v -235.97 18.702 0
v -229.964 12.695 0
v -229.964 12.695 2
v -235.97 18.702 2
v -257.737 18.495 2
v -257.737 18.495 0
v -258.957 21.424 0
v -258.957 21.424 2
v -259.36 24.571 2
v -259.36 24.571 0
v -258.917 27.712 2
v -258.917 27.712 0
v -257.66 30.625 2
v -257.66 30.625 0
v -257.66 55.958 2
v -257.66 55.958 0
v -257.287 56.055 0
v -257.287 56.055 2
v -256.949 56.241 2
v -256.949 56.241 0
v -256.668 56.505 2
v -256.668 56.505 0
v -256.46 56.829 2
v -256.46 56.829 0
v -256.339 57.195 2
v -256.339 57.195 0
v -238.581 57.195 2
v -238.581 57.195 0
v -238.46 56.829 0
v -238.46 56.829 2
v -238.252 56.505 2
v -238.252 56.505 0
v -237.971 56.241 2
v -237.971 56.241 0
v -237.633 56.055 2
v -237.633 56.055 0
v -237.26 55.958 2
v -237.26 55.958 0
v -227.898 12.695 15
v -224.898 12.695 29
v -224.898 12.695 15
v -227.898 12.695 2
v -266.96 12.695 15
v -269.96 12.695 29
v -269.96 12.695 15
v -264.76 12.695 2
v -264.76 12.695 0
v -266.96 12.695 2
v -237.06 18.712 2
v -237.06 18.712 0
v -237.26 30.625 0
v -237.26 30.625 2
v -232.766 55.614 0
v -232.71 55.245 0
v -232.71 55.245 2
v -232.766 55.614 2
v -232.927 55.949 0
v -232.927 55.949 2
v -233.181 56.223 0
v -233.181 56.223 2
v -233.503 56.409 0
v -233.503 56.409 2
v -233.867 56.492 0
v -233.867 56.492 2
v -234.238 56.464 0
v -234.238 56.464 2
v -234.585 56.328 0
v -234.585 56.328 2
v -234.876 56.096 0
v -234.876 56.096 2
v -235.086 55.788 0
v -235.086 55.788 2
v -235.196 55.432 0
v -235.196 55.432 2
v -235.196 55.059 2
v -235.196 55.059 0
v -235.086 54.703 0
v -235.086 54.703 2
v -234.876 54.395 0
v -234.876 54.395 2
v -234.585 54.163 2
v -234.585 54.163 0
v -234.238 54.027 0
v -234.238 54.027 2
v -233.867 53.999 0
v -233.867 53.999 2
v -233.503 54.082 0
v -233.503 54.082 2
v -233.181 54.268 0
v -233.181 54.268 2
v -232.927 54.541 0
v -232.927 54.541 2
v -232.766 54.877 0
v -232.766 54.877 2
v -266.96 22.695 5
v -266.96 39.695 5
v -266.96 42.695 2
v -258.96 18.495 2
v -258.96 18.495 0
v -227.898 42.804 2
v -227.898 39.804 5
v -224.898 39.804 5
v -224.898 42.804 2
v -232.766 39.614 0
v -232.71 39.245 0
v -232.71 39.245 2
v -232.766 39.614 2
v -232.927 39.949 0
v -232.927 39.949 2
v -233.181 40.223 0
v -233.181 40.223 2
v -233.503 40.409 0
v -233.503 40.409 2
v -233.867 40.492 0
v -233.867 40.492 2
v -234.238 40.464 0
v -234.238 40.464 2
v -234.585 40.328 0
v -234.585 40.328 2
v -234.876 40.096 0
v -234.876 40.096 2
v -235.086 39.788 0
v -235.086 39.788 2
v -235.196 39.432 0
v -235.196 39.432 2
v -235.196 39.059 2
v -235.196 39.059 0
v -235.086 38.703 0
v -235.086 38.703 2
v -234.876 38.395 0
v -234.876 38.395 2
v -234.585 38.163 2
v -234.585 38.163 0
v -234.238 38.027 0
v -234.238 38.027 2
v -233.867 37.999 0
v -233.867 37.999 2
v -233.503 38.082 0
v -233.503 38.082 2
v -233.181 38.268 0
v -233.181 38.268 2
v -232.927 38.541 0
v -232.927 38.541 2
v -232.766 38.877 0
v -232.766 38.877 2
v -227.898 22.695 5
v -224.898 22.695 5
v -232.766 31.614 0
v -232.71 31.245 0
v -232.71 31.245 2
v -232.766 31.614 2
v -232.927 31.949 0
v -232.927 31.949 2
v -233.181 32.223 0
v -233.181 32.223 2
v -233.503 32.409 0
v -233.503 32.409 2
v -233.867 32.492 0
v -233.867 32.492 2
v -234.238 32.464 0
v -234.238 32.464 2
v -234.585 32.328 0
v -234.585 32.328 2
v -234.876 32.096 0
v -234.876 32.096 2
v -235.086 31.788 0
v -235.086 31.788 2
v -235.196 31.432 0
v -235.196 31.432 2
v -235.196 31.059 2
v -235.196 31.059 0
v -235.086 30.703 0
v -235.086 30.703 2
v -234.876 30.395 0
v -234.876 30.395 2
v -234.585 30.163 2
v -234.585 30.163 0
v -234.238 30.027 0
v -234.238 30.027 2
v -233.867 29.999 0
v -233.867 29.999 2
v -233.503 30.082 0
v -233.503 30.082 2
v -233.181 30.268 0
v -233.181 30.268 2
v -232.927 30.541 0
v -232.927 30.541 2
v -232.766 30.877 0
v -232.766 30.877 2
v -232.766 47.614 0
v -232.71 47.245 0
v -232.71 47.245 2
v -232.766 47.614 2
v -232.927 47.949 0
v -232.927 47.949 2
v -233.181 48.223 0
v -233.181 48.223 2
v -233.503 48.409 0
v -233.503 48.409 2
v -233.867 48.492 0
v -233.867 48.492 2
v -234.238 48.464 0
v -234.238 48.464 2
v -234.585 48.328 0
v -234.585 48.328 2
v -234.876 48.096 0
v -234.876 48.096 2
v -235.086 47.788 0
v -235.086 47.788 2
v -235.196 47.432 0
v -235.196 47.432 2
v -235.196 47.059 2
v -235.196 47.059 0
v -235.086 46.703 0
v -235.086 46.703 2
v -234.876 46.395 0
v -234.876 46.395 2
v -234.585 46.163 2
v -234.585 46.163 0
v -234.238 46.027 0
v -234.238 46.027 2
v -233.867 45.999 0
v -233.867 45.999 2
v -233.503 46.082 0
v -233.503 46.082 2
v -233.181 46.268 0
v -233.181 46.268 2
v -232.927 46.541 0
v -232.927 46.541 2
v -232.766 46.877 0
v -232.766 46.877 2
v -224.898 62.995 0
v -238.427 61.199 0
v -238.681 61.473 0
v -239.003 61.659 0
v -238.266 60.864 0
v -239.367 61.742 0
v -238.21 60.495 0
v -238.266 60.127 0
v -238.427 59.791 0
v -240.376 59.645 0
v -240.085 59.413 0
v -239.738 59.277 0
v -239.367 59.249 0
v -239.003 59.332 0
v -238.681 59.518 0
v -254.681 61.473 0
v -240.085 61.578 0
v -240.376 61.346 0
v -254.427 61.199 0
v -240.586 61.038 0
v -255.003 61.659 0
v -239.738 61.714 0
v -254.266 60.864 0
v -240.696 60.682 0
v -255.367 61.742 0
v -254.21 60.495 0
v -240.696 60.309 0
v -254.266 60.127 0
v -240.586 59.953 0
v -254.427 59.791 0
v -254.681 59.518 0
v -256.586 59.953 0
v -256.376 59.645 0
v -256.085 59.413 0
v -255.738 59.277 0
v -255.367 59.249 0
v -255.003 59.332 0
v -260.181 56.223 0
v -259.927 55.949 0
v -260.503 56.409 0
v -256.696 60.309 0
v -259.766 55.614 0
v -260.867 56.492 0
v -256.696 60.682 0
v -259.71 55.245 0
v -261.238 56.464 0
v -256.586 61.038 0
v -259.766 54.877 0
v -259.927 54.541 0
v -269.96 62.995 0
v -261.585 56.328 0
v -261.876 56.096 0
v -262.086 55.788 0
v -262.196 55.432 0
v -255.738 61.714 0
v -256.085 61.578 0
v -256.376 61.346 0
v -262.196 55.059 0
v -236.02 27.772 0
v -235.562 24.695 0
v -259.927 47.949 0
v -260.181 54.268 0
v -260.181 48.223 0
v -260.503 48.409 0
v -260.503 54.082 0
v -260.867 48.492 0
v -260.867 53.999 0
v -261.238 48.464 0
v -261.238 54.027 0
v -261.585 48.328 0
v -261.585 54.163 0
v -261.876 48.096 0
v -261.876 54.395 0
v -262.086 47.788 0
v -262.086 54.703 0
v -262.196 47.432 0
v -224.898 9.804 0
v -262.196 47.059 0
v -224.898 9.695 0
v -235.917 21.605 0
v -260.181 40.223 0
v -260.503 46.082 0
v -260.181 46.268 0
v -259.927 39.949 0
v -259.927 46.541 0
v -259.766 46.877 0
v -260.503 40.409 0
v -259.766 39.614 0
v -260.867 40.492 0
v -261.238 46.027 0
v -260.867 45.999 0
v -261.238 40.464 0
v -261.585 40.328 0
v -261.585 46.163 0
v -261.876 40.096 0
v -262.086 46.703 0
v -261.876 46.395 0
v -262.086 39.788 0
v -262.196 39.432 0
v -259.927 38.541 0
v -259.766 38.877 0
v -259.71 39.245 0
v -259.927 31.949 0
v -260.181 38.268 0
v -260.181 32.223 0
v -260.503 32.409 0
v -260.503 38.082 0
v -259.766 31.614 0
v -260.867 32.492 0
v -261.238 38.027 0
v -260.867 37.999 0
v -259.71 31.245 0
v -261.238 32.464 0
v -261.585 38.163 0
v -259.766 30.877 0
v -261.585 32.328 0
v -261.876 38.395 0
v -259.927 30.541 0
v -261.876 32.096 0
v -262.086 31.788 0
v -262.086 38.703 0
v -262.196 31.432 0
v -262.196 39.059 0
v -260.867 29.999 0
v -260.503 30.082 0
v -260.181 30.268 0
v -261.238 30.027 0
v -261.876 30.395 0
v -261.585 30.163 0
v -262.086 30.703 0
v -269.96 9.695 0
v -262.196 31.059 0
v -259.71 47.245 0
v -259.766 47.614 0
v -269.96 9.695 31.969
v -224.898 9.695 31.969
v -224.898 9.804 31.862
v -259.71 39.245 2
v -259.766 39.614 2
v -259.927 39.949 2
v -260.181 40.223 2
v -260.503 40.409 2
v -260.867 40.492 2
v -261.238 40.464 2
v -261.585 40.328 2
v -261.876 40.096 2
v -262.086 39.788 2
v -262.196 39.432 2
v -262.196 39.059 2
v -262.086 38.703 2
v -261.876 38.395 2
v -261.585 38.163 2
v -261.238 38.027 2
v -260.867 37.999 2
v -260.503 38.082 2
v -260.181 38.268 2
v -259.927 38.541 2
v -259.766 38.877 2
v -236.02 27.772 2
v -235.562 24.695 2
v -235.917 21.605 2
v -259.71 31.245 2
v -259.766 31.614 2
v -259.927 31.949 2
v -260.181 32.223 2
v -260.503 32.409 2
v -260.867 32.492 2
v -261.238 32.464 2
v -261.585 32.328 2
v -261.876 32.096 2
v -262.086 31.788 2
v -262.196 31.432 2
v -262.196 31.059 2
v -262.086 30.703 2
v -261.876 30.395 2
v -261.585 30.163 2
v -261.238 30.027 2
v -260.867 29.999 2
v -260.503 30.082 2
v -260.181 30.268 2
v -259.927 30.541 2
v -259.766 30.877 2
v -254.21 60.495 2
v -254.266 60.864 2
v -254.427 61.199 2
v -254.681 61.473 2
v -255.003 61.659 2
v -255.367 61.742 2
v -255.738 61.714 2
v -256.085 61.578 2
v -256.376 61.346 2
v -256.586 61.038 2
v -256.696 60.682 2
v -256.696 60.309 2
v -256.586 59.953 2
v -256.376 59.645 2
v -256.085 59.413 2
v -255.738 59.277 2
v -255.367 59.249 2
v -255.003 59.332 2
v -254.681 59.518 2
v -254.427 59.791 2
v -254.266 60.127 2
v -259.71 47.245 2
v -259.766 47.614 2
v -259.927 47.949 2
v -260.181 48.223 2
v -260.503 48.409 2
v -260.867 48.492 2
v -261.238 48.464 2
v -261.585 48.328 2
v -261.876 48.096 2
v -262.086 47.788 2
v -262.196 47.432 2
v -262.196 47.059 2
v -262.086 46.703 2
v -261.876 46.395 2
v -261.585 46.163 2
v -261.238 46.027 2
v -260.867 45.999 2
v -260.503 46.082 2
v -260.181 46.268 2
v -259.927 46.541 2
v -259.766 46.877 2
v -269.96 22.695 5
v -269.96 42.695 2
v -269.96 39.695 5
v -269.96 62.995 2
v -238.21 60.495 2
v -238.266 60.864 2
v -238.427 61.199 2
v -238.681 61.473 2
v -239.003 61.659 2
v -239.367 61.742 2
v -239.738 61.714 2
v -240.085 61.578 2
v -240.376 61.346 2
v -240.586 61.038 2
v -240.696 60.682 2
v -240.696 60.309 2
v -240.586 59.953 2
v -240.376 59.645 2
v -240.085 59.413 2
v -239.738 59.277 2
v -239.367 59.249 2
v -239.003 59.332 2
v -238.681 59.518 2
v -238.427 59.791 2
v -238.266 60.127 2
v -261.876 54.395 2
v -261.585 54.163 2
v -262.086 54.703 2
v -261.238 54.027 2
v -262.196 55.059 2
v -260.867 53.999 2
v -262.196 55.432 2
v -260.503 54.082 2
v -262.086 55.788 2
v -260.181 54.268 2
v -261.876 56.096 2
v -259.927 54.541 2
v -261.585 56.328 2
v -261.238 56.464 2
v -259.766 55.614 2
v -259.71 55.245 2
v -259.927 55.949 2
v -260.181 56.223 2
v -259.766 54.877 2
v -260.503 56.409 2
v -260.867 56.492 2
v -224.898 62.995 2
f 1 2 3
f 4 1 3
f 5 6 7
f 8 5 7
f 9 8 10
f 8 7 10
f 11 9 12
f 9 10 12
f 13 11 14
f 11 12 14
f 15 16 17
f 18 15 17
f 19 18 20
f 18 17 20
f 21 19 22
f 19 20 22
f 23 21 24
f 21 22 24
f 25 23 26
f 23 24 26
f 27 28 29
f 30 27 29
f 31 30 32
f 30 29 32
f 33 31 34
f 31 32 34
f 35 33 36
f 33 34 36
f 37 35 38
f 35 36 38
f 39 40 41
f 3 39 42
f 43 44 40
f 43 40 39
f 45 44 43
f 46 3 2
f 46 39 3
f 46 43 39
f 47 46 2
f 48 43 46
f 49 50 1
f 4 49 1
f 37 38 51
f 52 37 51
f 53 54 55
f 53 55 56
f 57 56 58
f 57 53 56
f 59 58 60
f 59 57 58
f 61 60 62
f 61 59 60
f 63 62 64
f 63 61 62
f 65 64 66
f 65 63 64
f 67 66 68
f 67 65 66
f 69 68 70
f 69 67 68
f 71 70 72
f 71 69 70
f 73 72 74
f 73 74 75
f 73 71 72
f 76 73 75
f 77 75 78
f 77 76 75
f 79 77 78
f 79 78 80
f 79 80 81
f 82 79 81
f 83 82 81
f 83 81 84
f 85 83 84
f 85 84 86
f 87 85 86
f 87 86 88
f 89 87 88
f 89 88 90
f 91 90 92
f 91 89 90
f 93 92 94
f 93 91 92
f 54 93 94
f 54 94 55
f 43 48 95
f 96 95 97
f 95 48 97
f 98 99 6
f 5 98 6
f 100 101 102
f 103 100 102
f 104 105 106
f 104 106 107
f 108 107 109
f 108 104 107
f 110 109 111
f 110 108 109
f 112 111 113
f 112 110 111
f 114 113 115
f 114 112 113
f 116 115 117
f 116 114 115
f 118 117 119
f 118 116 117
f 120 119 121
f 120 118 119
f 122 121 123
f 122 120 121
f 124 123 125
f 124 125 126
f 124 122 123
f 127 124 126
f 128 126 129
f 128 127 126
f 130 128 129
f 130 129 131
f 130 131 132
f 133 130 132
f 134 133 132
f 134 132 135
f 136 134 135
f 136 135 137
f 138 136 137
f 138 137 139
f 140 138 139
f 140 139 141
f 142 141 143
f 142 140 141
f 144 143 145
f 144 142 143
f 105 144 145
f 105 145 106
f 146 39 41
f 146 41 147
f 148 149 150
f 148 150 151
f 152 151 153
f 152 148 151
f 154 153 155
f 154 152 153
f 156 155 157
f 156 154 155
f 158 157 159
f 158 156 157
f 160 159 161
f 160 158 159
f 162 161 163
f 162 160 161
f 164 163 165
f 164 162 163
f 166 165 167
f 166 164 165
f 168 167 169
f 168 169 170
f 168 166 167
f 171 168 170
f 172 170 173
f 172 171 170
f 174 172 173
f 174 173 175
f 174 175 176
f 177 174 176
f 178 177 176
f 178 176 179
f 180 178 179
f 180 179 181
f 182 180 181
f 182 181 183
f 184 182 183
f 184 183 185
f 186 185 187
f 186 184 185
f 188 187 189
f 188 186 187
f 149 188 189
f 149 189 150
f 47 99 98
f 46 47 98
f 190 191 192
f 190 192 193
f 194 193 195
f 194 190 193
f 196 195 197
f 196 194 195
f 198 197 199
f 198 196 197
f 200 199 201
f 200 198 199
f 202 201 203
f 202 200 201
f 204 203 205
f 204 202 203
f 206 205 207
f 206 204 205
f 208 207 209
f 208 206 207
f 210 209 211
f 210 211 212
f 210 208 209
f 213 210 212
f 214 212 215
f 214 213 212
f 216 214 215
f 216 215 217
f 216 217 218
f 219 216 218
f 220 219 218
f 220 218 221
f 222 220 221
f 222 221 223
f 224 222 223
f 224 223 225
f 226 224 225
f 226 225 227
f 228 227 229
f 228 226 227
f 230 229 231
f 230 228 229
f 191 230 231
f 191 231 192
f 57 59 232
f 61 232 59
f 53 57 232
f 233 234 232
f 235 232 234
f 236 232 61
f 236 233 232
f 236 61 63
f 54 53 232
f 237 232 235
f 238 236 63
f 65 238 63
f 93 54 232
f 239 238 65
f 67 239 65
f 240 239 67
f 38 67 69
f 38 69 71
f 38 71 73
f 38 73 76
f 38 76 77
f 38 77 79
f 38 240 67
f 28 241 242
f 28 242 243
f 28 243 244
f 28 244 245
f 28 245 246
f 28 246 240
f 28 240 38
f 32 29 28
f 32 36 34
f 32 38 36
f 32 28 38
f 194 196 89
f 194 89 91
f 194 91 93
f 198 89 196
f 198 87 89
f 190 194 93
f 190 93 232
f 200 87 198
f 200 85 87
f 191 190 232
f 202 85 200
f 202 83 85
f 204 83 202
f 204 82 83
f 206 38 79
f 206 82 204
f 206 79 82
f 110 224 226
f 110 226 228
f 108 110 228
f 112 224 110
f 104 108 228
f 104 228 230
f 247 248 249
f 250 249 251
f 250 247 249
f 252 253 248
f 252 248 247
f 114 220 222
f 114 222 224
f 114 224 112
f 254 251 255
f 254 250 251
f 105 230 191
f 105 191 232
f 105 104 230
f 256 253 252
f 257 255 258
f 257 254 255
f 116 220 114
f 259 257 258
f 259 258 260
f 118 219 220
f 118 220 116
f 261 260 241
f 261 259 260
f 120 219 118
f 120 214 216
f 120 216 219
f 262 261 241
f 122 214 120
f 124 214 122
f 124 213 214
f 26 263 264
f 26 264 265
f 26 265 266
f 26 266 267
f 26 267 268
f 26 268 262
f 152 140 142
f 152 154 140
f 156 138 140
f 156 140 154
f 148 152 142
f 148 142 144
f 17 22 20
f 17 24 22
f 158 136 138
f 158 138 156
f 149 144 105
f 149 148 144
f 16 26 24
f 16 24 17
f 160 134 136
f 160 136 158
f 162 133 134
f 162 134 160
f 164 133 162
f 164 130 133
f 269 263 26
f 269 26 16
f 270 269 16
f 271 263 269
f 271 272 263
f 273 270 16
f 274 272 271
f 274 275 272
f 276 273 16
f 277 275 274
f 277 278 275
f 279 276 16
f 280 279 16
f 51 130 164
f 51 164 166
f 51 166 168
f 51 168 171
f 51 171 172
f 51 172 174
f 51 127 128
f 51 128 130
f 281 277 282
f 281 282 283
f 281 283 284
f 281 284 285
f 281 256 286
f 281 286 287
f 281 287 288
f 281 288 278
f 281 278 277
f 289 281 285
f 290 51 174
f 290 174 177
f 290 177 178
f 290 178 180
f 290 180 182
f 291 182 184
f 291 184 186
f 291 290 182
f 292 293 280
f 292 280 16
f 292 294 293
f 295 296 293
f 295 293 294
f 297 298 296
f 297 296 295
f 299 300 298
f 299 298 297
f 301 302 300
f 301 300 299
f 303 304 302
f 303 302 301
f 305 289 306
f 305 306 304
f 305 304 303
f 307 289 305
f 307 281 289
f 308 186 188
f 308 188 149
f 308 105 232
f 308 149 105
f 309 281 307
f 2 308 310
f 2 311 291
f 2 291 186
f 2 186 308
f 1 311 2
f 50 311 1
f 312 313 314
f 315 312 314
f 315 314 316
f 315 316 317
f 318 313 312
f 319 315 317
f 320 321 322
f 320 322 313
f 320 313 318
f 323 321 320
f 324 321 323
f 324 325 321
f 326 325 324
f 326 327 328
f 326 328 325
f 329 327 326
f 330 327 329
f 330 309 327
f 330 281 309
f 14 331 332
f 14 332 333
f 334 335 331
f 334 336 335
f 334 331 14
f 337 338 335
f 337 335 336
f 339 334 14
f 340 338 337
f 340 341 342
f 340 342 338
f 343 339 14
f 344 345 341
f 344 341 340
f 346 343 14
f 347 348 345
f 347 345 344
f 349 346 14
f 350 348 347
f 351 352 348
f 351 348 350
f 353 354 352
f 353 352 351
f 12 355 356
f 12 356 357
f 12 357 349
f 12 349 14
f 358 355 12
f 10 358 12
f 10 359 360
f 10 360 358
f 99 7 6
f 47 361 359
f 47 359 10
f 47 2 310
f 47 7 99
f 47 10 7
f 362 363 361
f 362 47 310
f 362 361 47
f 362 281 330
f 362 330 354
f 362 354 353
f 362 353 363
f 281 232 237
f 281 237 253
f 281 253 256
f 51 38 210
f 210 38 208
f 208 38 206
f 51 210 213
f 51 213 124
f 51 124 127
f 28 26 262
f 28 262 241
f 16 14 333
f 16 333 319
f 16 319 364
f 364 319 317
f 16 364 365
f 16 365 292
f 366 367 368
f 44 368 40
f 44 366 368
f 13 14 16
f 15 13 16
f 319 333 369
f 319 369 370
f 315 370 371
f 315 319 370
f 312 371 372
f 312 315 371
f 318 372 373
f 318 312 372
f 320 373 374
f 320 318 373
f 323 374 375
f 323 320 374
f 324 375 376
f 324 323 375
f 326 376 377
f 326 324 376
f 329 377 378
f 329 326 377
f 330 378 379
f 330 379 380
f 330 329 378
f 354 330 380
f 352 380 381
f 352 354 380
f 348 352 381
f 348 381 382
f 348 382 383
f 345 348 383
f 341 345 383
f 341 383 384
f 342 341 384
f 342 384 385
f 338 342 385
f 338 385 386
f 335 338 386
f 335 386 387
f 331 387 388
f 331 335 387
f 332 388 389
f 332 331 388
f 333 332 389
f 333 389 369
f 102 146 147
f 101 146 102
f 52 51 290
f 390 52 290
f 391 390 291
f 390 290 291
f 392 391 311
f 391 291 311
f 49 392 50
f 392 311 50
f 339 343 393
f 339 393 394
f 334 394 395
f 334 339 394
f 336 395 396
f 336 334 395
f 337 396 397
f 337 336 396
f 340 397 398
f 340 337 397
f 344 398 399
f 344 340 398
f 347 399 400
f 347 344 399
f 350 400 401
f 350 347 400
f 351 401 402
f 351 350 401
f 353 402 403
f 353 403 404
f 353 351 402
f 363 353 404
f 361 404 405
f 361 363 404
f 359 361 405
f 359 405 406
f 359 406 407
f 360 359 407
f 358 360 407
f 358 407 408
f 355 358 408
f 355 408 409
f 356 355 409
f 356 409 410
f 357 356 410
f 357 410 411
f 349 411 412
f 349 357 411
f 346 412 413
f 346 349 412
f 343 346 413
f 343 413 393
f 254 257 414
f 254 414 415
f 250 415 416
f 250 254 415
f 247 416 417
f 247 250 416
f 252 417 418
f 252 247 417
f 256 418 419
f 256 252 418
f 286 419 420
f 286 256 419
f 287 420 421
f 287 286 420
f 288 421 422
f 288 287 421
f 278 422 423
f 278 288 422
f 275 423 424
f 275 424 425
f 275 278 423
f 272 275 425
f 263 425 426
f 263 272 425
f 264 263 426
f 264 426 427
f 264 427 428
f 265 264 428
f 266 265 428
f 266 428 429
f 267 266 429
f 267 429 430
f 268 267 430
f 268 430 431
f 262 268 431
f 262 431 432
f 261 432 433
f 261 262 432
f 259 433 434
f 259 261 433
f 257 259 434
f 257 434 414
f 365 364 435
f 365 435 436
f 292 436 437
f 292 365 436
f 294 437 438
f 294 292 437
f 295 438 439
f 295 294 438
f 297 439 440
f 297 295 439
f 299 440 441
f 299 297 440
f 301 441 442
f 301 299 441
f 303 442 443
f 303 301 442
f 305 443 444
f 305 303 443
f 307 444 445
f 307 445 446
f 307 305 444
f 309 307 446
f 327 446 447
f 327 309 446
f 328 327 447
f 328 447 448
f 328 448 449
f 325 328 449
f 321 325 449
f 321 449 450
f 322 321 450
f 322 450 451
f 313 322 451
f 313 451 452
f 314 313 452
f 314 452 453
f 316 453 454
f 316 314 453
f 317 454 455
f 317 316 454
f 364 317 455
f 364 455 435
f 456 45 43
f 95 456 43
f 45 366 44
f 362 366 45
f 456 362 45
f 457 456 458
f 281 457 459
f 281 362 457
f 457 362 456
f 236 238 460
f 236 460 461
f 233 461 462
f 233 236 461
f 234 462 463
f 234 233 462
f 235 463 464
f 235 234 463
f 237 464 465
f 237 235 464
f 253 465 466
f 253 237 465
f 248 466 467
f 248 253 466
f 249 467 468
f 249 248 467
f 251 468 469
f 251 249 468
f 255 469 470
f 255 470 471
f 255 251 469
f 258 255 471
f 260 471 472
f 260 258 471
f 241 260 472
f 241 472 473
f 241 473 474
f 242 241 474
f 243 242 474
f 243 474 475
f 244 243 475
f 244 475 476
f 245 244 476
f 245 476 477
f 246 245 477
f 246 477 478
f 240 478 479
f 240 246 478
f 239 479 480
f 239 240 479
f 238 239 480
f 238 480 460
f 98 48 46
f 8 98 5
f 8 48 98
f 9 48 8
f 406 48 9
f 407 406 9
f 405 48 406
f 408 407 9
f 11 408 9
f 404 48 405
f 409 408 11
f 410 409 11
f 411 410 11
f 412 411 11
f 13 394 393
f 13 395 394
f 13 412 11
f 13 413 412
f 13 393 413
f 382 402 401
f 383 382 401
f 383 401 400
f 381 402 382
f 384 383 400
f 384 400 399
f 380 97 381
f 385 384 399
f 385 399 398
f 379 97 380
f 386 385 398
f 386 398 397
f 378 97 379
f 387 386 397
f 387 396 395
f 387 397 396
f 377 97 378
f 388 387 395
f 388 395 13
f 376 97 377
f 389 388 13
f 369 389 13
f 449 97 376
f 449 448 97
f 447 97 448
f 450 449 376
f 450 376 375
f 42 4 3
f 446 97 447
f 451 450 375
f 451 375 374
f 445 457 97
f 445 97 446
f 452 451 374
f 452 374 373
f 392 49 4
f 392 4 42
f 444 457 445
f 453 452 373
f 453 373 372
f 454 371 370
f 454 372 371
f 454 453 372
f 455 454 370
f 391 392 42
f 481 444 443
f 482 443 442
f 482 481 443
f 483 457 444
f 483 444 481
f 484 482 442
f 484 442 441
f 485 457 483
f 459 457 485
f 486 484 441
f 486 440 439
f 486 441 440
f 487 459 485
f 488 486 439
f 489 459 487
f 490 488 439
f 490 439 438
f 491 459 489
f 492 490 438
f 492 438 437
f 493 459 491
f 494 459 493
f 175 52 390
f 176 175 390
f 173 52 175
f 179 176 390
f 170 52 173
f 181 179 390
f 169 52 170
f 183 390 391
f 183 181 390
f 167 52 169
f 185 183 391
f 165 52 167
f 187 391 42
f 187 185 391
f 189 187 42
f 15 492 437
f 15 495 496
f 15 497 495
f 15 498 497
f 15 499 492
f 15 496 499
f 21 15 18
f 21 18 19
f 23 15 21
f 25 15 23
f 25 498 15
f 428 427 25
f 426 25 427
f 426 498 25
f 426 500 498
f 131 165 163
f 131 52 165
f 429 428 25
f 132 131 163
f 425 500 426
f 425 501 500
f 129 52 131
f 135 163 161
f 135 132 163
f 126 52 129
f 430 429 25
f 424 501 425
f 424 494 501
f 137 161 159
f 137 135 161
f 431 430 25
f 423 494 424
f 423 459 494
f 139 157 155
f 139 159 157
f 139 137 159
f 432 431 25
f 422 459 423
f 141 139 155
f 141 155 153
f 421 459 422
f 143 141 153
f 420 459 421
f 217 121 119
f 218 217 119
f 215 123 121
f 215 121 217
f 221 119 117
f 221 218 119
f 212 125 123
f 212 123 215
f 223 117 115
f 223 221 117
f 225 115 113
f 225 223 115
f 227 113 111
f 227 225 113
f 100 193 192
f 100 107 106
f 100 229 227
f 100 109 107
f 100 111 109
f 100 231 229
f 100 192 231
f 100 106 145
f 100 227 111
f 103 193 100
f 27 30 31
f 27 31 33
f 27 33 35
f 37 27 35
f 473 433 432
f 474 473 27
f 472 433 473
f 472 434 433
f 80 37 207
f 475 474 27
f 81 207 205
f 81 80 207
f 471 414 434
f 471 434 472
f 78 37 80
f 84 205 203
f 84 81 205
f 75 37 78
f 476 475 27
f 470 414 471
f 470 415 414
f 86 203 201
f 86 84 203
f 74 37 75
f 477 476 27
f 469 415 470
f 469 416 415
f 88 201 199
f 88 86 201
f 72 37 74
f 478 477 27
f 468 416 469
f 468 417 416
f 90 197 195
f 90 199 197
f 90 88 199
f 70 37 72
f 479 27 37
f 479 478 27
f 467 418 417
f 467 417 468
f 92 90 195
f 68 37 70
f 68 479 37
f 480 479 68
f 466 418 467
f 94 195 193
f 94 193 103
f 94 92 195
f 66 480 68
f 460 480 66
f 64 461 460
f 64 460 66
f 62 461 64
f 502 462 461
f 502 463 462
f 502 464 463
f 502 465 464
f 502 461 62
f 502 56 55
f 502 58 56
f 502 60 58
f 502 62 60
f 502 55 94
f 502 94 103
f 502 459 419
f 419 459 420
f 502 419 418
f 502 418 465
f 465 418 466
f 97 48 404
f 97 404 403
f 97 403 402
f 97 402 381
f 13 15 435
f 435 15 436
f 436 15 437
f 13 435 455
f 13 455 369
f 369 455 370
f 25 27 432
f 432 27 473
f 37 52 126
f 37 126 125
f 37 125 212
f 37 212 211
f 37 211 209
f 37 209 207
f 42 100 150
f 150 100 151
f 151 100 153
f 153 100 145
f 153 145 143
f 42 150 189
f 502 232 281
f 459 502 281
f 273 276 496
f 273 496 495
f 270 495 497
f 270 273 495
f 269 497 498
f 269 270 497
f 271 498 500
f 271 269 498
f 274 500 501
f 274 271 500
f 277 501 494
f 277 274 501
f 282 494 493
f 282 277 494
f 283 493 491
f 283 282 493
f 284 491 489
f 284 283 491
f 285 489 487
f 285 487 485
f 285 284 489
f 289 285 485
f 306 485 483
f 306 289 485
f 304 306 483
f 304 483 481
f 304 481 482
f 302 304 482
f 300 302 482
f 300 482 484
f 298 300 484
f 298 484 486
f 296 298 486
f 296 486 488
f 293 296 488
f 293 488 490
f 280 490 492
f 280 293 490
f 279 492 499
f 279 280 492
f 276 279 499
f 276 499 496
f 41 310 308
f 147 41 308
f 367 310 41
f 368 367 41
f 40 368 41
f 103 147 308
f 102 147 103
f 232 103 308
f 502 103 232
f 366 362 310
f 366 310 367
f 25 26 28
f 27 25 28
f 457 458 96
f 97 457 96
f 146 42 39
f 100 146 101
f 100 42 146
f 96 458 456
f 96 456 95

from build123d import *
from OCP.BRepFilletAPI import BRepFilletAPI_MakeChamfer
from build123d.topology import SkipClean

# Parameters (mm, degrees)
SZKIC2_R                         = 1.25
DODANIE_WYCI_GNI_CIE2_DEPTH      = 2
DODANIE_WYCI_GNI_CIE3_DEPTH      = 3
DODANIE_WYCI_GNI_CIE3_DEPTH_BACK = 2
SZKIC3_W                         = 6
SZKIC3_H                         = 30
DODANIE_WYCI_GNI_CIE4_DEPTH      = 30
DODANIE_WYCI_GNI_CIE4_DEPTH_BACK = 2
SZKIC4_W                         = 6
SZKIC4_H                         = 3
SFAZOWANIE1_SIZE                 = 8
SFAZOWANIE1_SIZE2                = 7.929766182
SFAZOWANIE1_SIZE2_2              = 8.072133677
SFAZOWANIE2_SIZE                 = 10
SFAZOWANIE3_SIZE                 = 3
SZKIC5_W                         = 38.5
SZKIC5_H                         = 53.3
SZKIC5_W_2                       = 38.438336307
SZKIC5_H_2                       = 53.191798748
WYTNIJ_WYCI_GNI_CIE1_DEPTH       = 48.5
DODANIE_WYCI_GNI_CIE5_DEPTH      = 42.061663693
WYTNIJ_WYCI_GNI_CIE2_DEPTH       = 50.5


with BuildPart() as part:
    # Szkic2 → Dodanie-wyciągnięcie2 (new body)
    with BuildSketch(Plane.XY):
        with BuildLine():
            Line((-191.460111356, 62.995312244), (-303.460111356, 62.995312244))
            Line((-303.460111356, 62.995312244), (-308.460111356, 57.995312244))
            Line((-308.460111356, 57.995312244), (-308.460111356, 23.495312244))
            Line((-308.460111356, 23.495312244), (-303.460111356, 18.495312244))
            Line((-303.460111356, 18.495312244), (-302.736783969, 18.495312244))
            ThreePointArc((-302.736783969, 18.495312244), (-304.359873615, 24.570533036), (-302.660111356, 30.624749412))
            Line((-302.660111356, 30.624749412), (-302.660111356, 55.958269629))
            ThreePointArc((-302.660111356, 55.958269629), (-301.800506396, 56.364057485), (-301.339420723, 57.195312244))
            Line((-301.339420723, 57.195312244), (-283.580801989, 57.195312244))
            ThreePointArc((-283.580801989, 57.195312244), (-283.119716316, 56.364057485), (-282.260111356, 55.958269629))
            Line((-282.260111356, 55.958269629), (-282.260111356, 30.624749412))
            ThreePointArc((-282.260111356, 30.624749412), (-280.560349096, 24.570533036), (-282.183438743, 18.495312244))
            Line((-282.183438743, 18.495312244), (-257.736783969, 18.495312244))
            ThreePointArc((-257.736783969, 18.495312244), (-259.359873615, 24.570533036), (-257.660111356, 30.624749412))
            Line((-257.660111356, 30.624749412), (-257.660111356, 55.958269629))
            ThreePointArc((-257.660111356, 55.958269629), (-256.800506396, 56.364057485), (-256.339420723, 57.195312244))
            Line((-256.339420723, 57.195312244), (-238.580801989, 57.195312244))
            ThreePointArc((-238.580801989, 57.195312244), (-238.119716316, 56.364057485), (-237.260111356, 55.958269629))
            Line((-237.260111356, 55.958269629), (-237.260111356, 30.624749412))
            ThreePointArc((-237.260111356, 30.624749412), (-235.561787998, 24.695065265), (-237.060111356, 18.711714747))
            Line((-237.060111356, 18.711714747), (-212.736783969, 18.495312244))
            ThreePointArc((-212.736783969, 18.495312244), (-214.359873615, 24.570533036), (-212.660111356, 30.624749412))
            Line((-212.660111356, 30.624749412), (-212.660111356, 55.958269629))
            ThreePointArc((-212.660111356, 55.958269629), (-211.800506396, 56.364057485), (-211.339420723, 57.195312244))
            Line((-211.339420723, 57.195312244), (-193.580801989, 57.195312244))
            ThreePointArc((-193.580801989, 57.195312244), (-193.119716316, 56.364057485), (-192.260111356, 55.958269629))
            Line((-192.260111356, 55.958269629), (-192.260111356, 30.624749412))
            ThreePointArc((-192.260111356, 30.624749412), (-190.560349096, 24.570533036), (-192.183438743, 18.495312244))
            Line((-192.183438743, 18.495312244), (-191.460111356, 18.495312244))
            Line((-191.460111356, 18.495312244), (-186.460111356, 23.495312244))
            Line((-186.460111356, 23.495312244), (-186.460111356, 57.995312244))
            Line((-186.460111356, 57.995312244), (-191.460111356, 62.995312244))
        make_face()
        with Locations((-305.960111356, 31.245312244)):
            Circle(SZKIC2_R, mode=Mode.SUBTRACT)
        with Locations((-278.960111356, 31.245312244)):
            Circle(SZKIC2_R, mode=Mode.SUBTRACT)
        with Locations((-305.960111356, 39.245312244)):
            Circle(SZKIC2_R, mode=Mode.SUBTRACT)
        with Locations((-278.960111356, 39.245312244)):
            Circle(SZKIC2_R, mode=Mode.SUBTRACT)
        with Locations((-260.960111356, 31.245312244)):
            Circle(SZKIC2_R, mode=Mode.SUBTRACT)
        with Locations((-260.960111356, 39.245312244)):
            Circle(SZKIC2_R, mode=Mode.SUBTRACT)
        with Locations((-233.960111356, 31.245312244)):
            Circle(SZKIC2_R, mode=Mode.SUBTRACT)
        with Locations((-233.960111356, 39.245312244)):
            Circle(SZKIC2_R, mode=Mode.SUBTRACT)
        with Locations((-215.960111356, 31.245312244)):
            Circle(SZKIC2_R, mode=Mode.SUBTRACT)
        with Locations((-188.960111356, 31.245312244)):
            Circle(SZKIC2_R, mode=Mode.SUBTRACT)
        with Locations((-215.960111356, 39.245312244)):
            Circle(SZKIC2_R, mode=Mode.SUBTRACT)
        with Locations((-188.960111356, 39.245312244)):
            Circle(SZKIC2_R, mode=Mode.SUBTRACT)
        with Locations((-305.960111356, 47.245312244)):
            Circle(SZKIC2_R, mode=Mode.SUBTRACT)
        with Locations((-278.960111356, 47.245312244)):
            Circle(SZKIC2_R, mode=Mode.SUBTRACT)
        with Locations((-260.960111356, 47.245312244)):
            Circle(SZKIC2_R, mode=Mode.SUBTRACT)
        with Locations((-305.960111356, 55.245312244)):
            Circle(SZKIC2_R, mode=Mode.SUBTRACT)
        with Locations((-278.960111356, 55.245312244)):
            Circle(SZKIC2_R, mode=Mode.SUBTRACT)
        with Locations((-300.460111356, 60.495312244)):
            Circle(SZKIC2_R, mode=Mode.SUBTRACT)
        with Locations((-284.460111356, 60.495312244)):
            Circle(SZKIC2_R, mode=Mode.SUBTRACT)
        with Locations((-260.960111356, 55.245312244)):
            Circle(SZKIC2_R, mode=Mode.SUBTRACT)
        with Locations((-255.460111356, 60.495312244)):
            Circle(SZKIC2_R, mode=Mode.SUBTRACT)
        with Locations((-233.960111356, 47.245312244)):
            Circle(SZKIC2_R, mode=Mode.SUBTRACT)
        with Locations((-215.960111356, 47.245312244)):
            Circle(SZKIC2_R, mode=Mode.SUBTRACT)
        with Locations((-188.960111356, 47.245312244)):
            Circle(SZKIC2_R, mode=Mode.SUBTRACT)
        with Locations((-233.960111356, 55.245312244)):
            Circle(SZKIC2_R, mode=Mode.SUBTRACT)
        with Locations((-239.460111356, 60.495312244)):
            Circle(SZKIC2_R, mode=Mode.SUBTRACT)
        with Locations((-215.960111356, 55.245312244)):
            Circle(SZKIC2_R, mode=Mode.SUBTRACT)
        with Locations((-188.960111356, 55.245312244)):
            Circle(SZKIC2_R, mode=Mode.SUBTRACT)
        with Locations((-210.460111356, 60.495312244)):
            Circle(SZKIC2_R, mode=Mode.SUBTRACT)
        with Locations((-194.460111356, 60.495312244)):
            Circle(SZKIC2_R, mode=Mode.SUBTRACT)
    extrude(amount=DODANIE_WYCI_GNI_CIE2_DEPTH)

    # Szkic3 → Dodanie-wyciągnięcie3 (add, two sides: drawn at the far end of the back side and taken through both)
    with BuildSketch(Plane.XY.offset(2).offset(-DODANIE_WYCI_GNI_CIE3_DEPTH_BACK)):
        with Locations((-269.960111356, 27.695312244)):
            Rectangle(SZKIC3_W, SZKIC3_H)
        with Locations((-224.898447663, 27.803513496)):
            Rectangle(SZKIC3_W, SZKIC3_H)
    extrude(amount=DODANIE_WYCI_GNI_CIE3_DEPTH + DODANIE_WYCI_GNI_CIE3_DEPTH_BACK)

    # Szkic4 → Dodanie-wyciągnięcie4 (add, two sides: drawn at the far end of the back side and taken through both)
    with BuildSketch(Plane.XY.offset(2).offset(-DODANIE_WYCI_GNI_CIE4_DEPTH_BACK)):
        with Locations((-269.960111356, 11.195312244)):
            Rectangle(SZKIC4_W, SZKIC4_H)
        with Locations((-224.898447663, 11.303513496)):
            Rectangle(SZKIC4_W, SZKIC4_H)
    extrude(amount=DODANIE_WYCI_GNI_CIE4_DEPTH + DODANIE_WYCI_GNI_CIE4_DEPTH_BACK)

    # Sfazowanie1: one chamfer whose edges measure the first distance from different faces: ONE call of the kernel's chamfer builder (chamfer() names one face for all edges)
    sfazowanie1_edges_1 = [part.edges().sort_by_distance(p)[0] for p in [
        (-266.960111356, 18.495312244, 1),
        (-272.960111356, 18.495312244, 1),
    ]]
    sfazowanie1_edges_2 = [part.edges().sort_by_distance(p)[0] for p in [
        (-221.898447663, 18.57682276, 1),
    ]]
    sfazowanie1_side_2 = [part.faces().sort_by_distance(p)[0] for p in [
        (-221.898447663, 14.190168128, 0.459673797),
    ]]
    sfazowanie1_edges_3 = [part.edges().sort_by_distance(p)[0] for p in [
        (-227.898447663, 18.630204232, 1),
    ]]
    sfazowanie1_side_3 = [part.faces().sort_by_distance(p)[0] for p in [
        (-227.898447663, 42.343839698, 3.5),
    ]]
    sfazowanie1 = BRepFilletAPI_MakeChamfer(part.part.solid().wrapped)
    for e in sfazowanie1_edges_1:
        sfazowanie1.Add(SFAZOWANIE1_SIZE, e.wrapped)
    for e in sfazowanie1_edges_2:
        sfazowanie1.Add(SFAZOWANIE1_SIZE, SFAZOWANIE1_SIZE2, e.wrapped, sfazowanie1_side_2[0].wrapped)  # the first distance lies on this face
    for e in sfazowanie1_edges_3:
        sfazowanie1.Add(SFAZOWANIE1_SIZE, SFAZOWANIE1_SIZE2_2, e.wrapped, sfazowanie1_side_3[0].wrapped)  # the first distance lies on this face
    add(Compound.cast(sfazowanie1.Shape()), mode=Mode.REPLACE)

    # Sfazowanie2
    sfazowanie2_edges = [part.edges().sort_by_distance(p)[0] for p in [
        (-269.960111356, 12.695312244, 5),
        (-224.898447663, 12.803513496, 5),
    ]]
    chamfer(sfazowanie2_edges, length=SFAZOWANIE2_SIZE)

    # Sfazowanie3
    sfazowanie3_edges = [part.edges().sort_by_distance(p)[0] for p in [
        (-224.898447663, 12.803513496, 32),
        (-269.960111356, 12.695312244, 32),
        (-224.898447663, 42.803513496, 5),
        (-269.960111356, 42.695312244, 5),
    ]]
    chamfer(sfazowanie3_edges, length=SFAZOWANIE3_SIZE - 0.0001)  # a hair under: the kernel refuses the full size

    # Szkic5 → Wytnij-wyciągnięcie1 (cut, symmetric)
    with BuildSketch(Plane.XY.offset(2)):
        with Locations((-289.210111356, 36.345312244)):
            Rectangle(SZKIC5_W, SZKIC5_H)
        with Locations((-205.67927951, 36.39941287)):
            Rectangle(SZKIC5_W_2, SZKIC5_H_2)
    extrude(amount=WYTNIJ_WYCI_GNI_CIE1_DEPTH, both=True, mode=Mode.SUBTRACT)

    # Szkic6 → Dodanie-wyciągnięcie5 (add)
    with SkipClean():  # the faces are left unmerged after this step: merging them gives an invalid solid
        with BuildSketch(Plane(origin=(-266.960111356, 0, 0), x_dir=(0, 0, -1), z_dir=(1, 0, 0))):
            Polygon((-32, 9.695312244), (-29, 12.695312244), (0, 12.695312244), (0, 9.695312244), align=None)
        extrude(amount=DODANIE_WYCI_GNI_CIE5_DEPTH)

    # Szkic7 → Wytnij-wyciągnięcie2 (cut, symmetric)
    with BuildSketch(Plane.ZY.offset(269.960111356)):
        Polygon((5, 22.695312244), (5, 31.42772167), (32, 31.42772167), (32, 9.664251066), (29, 12.695312244), (15, 12.695312244), align=None)
    extrude(amount=WYTNIJ_WYCI_GNI_CIE2_DEPTH, both=True, mode=Mode.SUBTRACT)


solid = part.part
